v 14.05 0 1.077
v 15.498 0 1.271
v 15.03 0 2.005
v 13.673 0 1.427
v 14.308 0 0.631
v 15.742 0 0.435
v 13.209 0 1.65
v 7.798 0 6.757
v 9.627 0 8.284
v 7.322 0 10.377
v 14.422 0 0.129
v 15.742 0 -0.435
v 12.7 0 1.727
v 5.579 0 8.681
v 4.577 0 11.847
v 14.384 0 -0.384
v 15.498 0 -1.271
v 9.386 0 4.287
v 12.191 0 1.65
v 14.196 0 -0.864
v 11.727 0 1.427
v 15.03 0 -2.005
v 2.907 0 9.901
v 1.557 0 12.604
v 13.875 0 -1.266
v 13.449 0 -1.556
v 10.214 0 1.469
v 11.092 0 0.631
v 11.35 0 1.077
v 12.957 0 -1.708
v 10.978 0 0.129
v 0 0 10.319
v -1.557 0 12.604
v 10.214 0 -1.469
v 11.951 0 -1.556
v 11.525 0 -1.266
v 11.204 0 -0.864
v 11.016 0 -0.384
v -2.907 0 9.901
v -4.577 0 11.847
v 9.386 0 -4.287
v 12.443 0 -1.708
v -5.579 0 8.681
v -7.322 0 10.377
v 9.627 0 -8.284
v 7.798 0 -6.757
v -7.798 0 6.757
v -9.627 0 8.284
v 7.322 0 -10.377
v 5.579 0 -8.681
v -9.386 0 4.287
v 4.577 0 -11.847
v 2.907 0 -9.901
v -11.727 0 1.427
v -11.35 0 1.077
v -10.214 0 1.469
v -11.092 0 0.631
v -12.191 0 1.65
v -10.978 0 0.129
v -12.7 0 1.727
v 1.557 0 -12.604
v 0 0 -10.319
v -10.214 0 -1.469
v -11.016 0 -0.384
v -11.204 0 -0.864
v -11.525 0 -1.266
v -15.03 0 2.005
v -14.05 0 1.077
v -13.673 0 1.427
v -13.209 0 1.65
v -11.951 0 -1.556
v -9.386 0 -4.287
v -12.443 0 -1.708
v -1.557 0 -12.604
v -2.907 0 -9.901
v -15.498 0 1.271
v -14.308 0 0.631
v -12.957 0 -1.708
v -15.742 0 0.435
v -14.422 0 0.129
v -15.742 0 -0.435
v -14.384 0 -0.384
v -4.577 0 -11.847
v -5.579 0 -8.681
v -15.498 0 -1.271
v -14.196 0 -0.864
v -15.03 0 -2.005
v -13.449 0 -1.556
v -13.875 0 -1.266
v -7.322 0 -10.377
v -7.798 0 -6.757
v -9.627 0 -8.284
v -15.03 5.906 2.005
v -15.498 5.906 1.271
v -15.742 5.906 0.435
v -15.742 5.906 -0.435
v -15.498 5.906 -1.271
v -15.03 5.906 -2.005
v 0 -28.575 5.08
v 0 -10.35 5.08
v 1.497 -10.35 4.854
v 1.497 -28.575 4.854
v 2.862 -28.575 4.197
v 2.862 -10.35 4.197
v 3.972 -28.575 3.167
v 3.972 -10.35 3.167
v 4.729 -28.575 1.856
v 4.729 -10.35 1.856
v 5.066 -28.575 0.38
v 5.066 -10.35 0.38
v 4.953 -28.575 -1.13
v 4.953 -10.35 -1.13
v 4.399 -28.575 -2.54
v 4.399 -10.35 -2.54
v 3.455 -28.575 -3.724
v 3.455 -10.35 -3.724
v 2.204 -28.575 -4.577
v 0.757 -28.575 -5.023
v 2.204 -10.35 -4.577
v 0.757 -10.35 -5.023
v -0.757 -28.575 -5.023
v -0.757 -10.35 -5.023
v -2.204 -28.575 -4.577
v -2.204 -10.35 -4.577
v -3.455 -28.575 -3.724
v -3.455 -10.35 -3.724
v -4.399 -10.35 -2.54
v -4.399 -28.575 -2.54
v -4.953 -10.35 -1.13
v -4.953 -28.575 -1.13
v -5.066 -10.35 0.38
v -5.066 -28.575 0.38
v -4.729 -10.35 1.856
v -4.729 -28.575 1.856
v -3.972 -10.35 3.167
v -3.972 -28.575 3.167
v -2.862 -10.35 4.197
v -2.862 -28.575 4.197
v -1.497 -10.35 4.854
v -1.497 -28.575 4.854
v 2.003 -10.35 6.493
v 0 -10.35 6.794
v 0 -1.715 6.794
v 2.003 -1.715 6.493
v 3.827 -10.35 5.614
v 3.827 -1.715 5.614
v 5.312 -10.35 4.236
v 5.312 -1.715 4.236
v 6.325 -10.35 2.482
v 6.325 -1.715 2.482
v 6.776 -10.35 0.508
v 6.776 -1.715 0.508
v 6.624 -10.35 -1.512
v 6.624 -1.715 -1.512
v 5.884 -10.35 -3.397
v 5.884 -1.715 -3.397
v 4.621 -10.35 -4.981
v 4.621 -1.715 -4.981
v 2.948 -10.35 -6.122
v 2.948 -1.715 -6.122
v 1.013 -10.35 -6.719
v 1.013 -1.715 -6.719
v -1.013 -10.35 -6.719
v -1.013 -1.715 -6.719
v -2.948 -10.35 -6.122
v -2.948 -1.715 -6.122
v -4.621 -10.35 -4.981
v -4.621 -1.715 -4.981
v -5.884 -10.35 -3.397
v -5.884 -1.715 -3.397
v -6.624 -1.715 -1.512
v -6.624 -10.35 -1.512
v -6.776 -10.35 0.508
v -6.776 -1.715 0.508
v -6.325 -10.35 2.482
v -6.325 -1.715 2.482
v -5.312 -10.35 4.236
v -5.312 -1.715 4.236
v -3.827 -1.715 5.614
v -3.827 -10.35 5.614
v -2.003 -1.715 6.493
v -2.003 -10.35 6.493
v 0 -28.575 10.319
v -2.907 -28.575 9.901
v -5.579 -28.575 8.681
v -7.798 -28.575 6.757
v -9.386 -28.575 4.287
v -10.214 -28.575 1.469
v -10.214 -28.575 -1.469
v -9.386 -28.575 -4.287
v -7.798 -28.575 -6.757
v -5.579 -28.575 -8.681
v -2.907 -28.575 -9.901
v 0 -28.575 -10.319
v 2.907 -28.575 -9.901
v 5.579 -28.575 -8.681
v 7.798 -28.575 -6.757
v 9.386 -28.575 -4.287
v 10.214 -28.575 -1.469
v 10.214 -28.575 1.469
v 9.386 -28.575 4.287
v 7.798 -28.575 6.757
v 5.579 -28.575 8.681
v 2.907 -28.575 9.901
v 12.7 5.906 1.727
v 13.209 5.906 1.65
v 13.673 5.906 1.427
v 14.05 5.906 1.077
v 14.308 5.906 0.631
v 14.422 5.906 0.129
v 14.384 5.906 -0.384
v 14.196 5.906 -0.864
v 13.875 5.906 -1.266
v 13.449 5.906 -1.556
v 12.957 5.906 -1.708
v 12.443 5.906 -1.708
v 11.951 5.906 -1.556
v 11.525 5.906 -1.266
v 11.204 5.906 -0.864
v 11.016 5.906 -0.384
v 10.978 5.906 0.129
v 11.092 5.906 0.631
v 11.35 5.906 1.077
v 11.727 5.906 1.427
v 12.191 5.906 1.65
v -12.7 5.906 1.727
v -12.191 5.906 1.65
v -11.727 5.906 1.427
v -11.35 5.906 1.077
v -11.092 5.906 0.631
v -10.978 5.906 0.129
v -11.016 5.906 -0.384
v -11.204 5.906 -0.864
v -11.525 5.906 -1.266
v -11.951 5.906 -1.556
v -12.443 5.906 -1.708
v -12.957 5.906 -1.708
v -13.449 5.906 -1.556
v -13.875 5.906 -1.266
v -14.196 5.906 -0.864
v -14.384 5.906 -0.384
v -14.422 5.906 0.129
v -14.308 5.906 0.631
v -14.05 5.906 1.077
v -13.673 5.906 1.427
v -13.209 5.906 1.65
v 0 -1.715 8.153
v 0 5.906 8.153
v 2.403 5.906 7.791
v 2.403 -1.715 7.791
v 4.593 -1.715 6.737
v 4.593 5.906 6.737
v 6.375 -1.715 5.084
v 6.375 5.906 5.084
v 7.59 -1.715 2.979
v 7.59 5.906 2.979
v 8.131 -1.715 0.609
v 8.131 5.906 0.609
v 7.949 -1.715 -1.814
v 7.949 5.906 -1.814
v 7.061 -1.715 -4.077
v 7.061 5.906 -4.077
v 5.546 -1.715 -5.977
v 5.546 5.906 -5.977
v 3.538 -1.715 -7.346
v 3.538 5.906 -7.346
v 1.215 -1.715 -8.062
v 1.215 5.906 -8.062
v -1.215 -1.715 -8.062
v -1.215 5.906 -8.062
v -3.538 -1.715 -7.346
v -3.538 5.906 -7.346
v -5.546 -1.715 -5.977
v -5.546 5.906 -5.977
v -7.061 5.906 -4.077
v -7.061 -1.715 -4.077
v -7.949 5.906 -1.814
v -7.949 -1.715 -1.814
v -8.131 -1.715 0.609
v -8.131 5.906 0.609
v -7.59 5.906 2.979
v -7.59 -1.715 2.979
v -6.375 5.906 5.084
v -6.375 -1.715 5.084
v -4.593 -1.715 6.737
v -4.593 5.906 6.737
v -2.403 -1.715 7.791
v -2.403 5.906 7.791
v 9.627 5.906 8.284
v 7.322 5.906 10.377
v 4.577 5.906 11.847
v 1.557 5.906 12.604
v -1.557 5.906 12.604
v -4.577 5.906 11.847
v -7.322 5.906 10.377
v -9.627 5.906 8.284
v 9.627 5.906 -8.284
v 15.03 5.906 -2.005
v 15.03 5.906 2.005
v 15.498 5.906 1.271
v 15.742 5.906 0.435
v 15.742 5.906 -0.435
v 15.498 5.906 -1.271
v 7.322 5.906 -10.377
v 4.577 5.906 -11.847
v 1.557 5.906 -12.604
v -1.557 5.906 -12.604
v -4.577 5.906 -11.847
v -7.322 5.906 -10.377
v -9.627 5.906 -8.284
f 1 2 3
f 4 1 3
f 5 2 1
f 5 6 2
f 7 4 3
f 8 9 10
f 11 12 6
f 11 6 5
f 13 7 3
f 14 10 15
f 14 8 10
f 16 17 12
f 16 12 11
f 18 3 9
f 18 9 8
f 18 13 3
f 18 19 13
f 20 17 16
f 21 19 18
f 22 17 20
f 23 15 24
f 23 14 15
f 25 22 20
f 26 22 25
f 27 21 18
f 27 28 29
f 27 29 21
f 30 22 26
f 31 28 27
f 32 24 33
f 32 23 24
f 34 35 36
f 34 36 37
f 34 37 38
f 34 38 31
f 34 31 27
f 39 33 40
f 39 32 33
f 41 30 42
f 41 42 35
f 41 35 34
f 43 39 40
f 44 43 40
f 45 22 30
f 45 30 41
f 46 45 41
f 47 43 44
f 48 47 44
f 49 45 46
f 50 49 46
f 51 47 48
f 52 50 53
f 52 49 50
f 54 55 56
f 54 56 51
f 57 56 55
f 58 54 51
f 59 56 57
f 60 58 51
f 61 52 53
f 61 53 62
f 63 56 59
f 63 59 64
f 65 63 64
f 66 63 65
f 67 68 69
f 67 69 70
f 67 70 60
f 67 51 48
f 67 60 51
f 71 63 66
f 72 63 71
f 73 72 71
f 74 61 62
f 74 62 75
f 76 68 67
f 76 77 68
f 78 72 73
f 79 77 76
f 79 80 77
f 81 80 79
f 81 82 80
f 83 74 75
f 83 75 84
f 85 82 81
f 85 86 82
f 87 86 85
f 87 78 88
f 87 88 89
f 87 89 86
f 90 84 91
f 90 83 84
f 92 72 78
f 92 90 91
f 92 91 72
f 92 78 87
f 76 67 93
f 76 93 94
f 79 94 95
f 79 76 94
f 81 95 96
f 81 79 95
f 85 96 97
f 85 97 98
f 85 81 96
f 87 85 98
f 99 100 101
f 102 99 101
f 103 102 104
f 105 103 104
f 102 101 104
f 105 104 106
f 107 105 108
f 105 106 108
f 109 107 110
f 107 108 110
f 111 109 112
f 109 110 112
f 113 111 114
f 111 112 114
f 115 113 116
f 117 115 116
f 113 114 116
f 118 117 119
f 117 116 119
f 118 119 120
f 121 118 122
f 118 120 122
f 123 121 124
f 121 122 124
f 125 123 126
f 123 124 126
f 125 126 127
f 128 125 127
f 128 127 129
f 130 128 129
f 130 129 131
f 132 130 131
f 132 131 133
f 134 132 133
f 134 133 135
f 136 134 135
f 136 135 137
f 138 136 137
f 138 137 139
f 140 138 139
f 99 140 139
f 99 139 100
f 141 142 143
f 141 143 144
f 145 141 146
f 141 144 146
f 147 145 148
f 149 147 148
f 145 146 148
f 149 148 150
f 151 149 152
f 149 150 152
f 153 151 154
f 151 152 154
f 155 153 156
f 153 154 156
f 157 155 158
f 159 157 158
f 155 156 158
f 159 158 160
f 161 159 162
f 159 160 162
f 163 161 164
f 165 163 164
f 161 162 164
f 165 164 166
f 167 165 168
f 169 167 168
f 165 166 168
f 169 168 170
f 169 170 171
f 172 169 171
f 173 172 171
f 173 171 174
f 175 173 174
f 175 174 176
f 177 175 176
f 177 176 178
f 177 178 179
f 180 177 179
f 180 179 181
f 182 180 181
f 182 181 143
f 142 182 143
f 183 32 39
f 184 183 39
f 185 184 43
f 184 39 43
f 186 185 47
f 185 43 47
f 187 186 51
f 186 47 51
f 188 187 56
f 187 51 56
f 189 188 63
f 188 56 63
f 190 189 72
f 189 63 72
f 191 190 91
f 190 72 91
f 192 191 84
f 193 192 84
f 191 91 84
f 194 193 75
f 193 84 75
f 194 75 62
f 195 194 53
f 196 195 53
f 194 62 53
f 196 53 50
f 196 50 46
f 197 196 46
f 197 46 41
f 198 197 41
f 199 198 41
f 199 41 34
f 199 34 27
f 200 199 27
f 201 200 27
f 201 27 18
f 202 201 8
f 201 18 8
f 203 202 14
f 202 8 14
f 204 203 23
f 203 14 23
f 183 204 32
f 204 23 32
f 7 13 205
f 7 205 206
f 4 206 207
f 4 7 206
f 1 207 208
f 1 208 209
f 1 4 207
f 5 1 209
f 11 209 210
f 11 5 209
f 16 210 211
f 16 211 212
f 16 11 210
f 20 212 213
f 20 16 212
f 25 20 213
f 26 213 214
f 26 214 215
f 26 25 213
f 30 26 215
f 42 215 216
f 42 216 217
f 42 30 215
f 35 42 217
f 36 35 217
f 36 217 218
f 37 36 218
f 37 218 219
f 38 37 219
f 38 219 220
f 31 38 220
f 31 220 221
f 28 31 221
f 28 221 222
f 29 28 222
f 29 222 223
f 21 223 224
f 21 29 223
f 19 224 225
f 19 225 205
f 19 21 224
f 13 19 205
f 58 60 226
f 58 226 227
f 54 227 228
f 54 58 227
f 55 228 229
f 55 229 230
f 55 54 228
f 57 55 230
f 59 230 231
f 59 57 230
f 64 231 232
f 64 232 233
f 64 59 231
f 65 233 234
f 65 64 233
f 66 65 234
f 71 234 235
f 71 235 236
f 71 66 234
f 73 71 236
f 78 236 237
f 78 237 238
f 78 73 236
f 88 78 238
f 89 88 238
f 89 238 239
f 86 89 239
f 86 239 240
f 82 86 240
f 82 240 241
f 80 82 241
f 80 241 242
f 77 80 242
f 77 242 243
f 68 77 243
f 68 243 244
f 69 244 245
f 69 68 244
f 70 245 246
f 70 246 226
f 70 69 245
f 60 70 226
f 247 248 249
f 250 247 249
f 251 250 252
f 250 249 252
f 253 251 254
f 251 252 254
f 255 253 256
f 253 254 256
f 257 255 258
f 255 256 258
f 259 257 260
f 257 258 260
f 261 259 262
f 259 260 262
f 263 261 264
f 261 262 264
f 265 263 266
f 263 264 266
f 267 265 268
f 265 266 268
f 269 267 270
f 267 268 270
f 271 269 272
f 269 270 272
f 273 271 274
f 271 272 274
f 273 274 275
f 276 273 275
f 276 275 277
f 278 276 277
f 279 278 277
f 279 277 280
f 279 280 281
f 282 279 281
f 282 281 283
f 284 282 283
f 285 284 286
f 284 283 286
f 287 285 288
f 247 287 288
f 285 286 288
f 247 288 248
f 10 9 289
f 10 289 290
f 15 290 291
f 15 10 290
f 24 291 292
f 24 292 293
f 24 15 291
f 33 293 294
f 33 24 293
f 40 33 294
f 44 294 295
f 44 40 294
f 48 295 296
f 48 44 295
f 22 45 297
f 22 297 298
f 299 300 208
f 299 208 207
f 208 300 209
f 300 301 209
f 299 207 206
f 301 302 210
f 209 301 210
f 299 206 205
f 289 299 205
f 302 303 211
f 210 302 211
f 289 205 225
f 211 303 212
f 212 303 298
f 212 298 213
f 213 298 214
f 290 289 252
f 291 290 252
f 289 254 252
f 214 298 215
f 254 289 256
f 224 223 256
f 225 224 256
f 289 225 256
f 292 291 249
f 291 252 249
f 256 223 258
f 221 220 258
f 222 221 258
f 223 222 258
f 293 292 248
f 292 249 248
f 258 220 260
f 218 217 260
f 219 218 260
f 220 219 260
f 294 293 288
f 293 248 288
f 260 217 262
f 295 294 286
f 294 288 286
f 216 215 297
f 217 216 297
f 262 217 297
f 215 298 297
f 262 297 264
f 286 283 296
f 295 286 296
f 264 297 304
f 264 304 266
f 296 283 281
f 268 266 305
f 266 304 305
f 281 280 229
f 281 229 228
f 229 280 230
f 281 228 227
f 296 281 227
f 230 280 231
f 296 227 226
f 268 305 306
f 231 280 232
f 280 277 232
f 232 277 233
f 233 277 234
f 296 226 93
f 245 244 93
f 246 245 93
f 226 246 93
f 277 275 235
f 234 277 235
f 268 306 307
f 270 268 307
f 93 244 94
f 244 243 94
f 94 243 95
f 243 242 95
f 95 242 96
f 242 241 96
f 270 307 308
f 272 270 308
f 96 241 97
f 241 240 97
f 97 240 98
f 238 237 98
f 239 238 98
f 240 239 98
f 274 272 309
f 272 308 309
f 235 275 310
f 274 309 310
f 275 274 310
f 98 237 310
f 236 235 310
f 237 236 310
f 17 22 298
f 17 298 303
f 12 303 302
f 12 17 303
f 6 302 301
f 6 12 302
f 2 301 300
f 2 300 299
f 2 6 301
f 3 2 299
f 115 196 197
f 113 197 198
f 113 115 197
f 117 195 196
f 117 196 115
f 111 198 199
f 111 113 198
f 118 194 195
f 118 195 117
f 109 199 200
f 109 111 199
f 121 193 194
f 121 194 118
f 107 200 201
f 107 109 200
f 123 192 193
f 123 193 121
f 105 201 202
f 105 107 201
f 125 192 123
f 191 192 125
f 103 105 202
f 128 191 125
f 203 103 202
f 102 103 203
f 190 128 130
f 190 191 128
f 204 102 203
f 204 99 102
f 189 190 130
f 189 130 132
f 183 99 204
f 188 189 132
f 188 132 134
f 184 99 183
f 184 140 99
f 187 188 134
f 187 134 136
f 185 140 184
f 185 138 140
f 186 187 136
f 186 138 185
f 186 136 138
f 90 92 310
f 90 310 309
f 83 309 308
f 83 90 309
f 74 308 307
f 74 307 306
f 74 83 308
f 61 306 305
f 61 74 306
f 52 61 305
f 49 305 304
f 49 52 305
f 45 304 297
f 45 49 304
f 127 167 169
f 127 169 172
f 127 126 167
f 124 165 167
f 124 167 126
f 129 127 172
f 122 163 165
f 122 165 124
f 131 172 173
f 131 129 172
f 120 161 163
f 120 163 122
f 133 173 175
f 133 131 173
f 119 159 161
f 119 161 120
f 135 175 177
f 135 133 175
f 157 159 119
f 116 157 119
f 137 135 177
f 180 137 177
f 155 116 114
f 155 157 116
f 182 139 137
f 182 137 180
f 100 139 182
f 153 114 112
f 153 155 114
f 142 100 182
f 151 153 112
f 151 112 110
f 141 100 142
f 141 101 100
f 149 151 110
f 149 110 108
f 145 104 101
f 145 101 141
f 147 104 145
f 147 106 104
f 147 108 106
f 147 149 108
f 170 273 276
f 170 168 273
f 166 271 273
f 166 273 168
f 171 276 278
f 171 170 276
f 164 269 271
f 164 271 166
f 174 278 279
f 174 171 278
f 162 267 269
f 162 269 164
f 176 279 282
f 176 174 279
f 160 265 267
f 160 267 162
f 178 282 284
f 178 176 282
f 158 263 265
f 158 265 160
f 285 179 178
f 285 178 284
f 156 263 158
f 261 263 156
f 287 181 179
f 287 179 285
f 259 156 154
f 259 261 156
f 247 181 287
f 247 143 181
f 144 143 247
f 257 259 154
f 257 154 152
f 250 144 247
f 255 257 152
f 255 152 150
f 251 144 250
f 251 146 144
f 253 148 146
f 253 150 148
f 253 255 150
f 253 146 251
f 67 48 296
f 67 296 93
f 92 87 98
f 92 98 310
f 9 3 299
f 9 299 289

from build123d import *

# Parameters (mm, degrees)
SKETCH1_R           = 1.7272
BOSS_EXTRUDE1_DEPTH = 5.9055
SKETCH2_R           = 10.31875
BOSS_EXTRUDE2_DEPTH = 28.575
SKETCH3_R           = 8.1534
CUT_EXTRUDE1_DEPTH  = 7.62
SKETCH4_R           = 6.7945
CUT_EXTRUDE2_DEPTH  = 16.256
SKETCH5_R           = 5.08
CUT_EXTRUDE3_DEPTH  = 40.987435874


with BuildPart() as part:
    # Sketch1 → Boss-Extrude1 (new body)
    with BuildSketch(Plane(origin=(0, 0, 0), x_dir=(1, 0, 0), z_dir=(0, 1, 0))):
        with BuildLine():
            Line((-15.0296372, 2.004639139), (-9.6266, 8.283632805))
            ThreePointArc((-9.6266, 8.283632805), (0, 12.7), (9.6266, 8.283632805))
            Line((9.6266, 8.283632805), (15.0296372, 2.004639139))
            ThreePointArc((15.0296372, 2.004639139), (15.7734, 0), (15.0296372, -2.004639139))
            Line((15.0296372, -2.004639139), (9.6266, -8.283632805))
            ThreePointArc((9.6266, -8.283632805), (0, -12.7), (-9.6266, -8.283632805))
            Line((-9.6266, -8.283632805), (-15.0296372, -2.004639139))
            ThreePointArc((-15.0296372, -2.004639139), (-15.7734, 0), (-15.0296372, 2.004639139))
        make_face()
        with Locations(Location((-12.7, 0, 0), (0, 0, 270))):
            Circle(SKETCH1_R, mode=Mode.SUBTRACT)
        with Locations(Location((12.7, 0, 0), (0, 0, 270))):
            Circle(SKETCH1_R, mode=Mode.SUBTRACT)
    extrude(amount=BOSS_EXTRUDE1_DEPTH)

    # Sketch2 → Boss-Extrude2 (add)
    with BuildSketch(Plane.XZ):
        with Locations(Location((0, 0, 0), (0, 0, 90))):
            Circle(SKETCH2_R)
    extrude(amount=BOSS_EXTRUDE2_DEPTH)

    # Sketch3 → Cut-Extrude1 (cut)
    with BuildSketch(Plane(origin=(0, 5.9055, 0), x_dir=(1, 0, 0), z_dir=(0, 1, 0))):
        with Locations(Location((0, 0, 0), (0, 0, 270))):
            Circle(SKETCH3_R)
    extrude(amount=-CUT_EXTRUDE1_DEPTH, mode=Mode.SUBTRACT)

    # Sketch4 → Cut-Extrude2 (cut)
    with BuildSketch(Plane(origin=(0, 5.9055, 0), x_dir=(1, 0, 0), z_dir=(0, 1, 0))):
        with Locations(Location((0, 0, 0), (0, 0, 270))):
            Circle(SKETCH4_R)
    extrude(amount=-CUT_EXTRUDE2_DEPTH, mode=Mode.SUBTRACT)

    # Sketch5 → Cut-Extrude3 (cut, through all)
    with BuildSketch(Plane(origin=(0, 5.9055, 0), x_dir=(1, 0, 0), z_dir=(0, 1, 0))):
        with Locations(Location((0, 0, 0), (0, 0, 270))):
            Circle(SKETCH5_R)
    extrude(amount=-CUT_EXTRUDE3_DEPTH, mode=Mode.SUBTRACT)


solid = part.part
